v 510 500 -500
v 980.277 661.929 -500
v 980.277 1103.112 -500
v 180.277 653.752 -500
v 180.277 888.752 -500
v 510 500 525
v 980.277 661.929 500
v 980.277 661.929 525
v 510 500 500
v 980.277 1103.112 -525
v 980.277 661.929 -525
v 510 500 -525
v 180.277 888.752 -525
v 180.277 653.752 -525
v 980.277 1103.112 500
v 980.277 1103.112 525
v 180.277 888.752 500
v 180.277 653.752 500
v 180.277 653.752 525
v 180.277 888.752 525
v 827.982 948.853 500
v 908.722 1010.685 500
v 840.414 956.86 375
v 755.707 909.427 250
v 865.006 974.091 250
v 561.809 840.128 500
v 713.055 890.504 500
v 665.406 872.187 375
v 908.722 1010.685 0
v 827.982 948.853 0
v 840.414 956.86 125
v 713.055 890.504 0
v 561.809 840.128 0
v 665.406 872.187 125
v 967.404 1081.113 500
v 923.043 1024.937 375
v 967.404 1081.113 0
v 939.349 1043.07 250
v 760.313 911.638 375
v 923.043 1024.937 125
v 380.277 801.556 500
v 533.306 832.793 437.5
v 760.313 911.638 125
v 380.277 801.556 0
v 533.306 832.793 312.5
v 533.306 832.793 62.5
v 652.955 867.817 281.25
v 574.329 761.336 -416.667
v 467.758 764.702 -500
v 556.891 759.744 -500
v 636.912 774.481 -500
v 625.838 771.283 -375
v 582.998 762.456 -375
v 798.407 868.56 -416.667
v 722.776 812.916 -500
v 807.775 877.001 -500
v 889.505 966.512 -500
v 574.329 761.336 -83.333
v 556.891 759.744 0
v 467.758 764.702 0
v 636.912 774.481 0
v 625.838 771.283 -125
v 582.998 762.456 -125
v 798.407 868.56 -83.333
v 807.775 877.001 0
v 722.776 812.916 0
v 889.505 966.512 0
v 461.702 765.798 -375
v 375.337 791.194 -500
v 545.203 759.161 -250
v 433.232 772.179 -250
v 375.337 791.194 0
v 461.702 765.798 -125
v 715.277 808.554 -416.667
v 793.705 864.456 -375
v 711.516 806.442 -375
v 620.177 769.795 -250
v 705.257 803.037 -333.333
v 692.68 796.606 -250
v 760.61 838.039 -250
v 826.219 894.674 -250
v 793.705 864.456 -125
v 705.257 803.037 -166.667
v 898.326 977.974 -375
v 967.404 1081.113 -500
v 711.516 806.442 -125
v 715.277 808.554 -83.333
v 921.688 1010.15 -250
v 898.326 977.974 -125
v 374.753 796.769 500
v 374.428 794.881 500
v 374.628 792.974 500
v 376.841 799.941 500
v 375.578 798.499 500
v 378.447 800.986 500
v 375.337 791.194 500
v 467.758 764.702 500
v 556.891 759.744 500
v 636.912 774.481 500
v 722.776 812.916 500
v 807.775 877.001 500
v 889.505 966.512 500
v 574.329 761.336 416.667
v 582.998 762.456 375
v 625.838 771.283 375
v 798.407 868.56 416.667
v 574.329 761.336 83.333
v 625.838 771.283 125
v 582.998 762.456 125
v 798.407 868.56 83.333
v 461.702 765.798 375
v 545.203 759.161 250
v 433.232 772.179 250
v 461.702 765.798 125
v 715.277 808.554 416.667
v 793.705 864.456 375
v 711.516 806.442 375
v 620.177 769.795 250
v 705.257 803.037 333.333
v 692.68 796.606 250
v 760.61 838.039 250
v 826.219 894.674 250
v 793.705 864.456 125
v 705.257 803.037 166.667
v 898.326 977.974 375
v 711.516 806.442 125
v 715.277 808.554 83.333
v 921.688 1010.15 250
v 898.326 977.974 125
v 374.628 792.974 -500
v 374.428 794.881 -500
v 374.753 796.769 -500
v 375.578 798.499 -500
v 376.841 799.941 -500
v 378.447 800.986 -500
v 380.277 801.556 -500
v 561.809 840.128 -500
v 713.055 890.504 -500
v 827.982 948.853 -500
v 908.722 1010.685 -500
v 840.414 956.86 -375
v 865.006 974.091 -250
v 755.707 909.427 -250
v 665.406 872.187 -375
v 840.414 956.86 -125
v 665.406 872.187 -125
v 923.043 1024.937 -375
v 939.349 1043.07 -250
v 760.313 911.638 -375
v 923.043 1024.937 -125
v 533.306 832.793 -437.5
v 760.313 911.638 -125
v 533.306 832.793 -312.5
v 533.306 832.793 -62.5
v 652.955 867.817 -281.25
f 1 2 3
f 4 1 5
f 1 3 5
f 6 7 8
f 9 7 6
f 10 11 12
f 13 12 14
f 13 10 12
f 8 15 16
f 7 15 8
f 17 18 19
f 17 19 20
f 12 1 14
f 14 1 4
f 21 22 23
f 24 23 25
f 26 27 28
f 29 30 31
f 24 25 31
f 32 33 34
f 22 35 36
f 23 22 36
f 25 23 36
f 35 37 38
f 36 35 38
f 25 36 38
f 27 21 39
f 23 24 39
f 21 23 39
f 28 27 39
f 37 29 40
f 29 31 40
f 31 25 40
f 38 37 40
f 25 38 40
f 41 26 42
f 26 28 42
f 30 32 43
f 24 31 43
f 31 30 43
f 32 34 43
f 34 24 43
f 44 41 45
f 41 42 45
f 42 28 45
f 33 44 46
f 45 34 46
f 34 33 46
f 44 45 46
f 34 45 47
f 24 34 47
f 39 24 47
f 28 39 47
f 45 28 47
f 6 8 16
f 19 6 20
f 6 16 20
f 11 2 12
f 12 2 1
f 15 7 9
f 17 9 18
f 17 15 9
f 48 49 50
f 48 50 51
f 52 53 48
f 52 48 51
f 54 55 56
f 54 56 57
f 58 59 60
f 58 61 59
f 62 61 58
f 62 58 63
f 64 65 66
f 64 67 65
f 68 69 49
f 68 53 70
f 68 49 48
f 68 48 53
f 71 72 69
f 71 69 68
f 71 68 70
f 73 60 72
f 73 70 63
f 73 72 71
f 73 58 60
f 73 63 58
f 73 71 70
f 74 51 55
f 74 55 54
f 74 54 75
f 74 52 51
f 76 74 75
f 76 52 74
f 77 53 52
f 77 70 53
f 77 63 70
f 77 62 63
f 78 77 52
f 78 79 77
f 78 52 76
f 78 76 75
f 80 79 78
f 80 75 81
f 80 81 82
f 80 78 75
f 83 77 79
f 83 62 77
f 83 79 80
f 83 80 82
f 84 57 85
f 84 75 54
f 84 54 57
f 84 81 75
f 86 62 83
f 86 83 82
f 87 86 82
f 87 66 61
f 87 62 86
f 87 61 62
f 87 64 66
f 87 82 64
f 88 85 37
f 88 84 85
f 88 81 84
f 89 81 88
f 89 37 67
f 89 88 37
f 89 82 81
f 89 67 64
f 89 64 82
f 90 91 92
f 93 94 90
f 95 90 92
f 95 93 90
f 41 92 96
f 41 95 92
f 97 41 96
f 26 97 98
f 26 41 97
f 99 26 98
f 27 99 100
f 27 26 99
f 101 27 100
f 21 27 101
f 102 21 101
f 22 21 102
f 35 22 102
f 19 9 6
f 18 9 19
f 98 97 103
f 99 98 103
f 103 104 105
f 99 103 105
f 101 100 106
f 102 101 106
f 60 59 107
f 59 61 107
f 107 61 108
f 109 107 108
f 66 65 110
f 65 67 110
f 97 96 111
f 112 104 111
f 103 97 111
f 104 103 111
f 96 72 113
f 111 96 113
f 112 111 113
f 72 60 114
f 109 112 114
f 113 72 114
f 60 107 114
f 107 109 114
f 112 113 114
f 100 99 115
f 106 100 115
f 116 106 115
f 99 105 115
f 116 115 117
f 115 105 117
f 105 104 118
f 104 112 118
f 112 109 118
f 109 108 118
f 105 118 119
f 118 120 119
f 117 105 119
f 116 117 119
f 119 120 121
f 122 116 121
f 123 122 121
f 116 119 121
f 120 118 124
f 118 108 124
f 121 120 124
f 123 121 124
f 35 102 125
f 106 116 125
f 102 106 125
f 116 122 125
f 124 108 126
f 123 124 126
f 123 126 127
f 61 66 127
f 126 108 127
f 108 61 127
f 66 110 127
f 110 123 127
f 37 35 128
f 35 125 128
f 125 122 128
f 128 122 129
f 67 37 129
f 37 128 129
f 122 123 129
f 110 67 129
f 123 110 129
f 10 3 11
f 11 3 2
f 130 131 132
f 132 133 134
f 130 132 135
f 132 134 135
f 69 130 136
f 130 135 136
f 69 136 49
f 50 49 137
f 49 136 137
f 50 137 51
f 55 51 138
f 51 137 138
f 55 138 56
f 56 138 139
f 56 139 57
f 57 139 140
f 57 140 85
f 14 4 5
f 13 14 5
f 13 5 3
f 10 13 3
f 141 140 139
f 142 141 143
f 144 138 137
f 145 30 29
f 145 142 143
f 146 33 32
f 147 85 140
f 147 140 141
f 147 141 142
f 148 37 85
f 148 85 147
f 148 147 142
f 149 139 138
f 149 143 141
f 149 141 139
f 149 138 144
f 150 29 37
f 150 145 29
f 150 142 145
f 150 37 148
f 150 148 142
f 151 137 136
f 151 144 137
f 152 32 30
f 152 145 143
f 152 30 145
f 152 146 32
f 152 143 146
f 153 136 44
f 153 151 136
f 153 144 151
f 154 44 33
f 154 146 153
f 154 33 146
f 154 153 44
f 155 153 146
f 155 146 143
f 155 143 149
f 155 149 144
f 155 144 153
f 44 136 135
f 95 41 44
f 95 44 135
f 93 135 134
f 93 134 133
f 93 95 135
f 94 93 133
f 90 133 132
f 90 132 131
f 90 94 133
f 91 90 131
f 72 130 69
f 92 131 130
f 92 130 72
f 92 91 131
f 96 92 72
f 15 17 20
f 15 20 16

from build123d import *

# Parameters (mm, degrees)
BOSS_EXTRUDE4_START = 500
BOSS_EXTRUDE4_DEPTH = 25
BOSS_EXTRUDE5_DEPTH = 500


with BuildPart() as part:
    # Sketch3 → Boss-Extrude4 (new body)
    with BuildSketch(Plane.XY.offset(BOSS_EXTRUDE4_START)):
        Polygon((980.277216874, 1103.111612785), (980.277216874, 661.929431671), (510, 500), (180.277216874, 653.75225884), (180.277216874, 888.75225884), align=None)
    extrude(amount=BOSS_EXTRUDE4_DEPTH)


with BuildPart() as body_2:
    # Mirror6: mirrored copy
    add(part.part.mirror(Plane.XY))


with BuildPart() as body_3:
    # Sketch4 → Boss-Extrude5 (new body, symmetric)
    with BuildSketch(Plane.XY):
        with BuildLine():
            add(Edge.make_bspline(
                [(375.337243968, 791.193870862), (713.99043586, 657.058073837), (967.403573874, 1081.113118762)],
                knots=[0, 0, 0, 0.975124618, 0.975124618, 0.975124618], degree=2))
            add(Edge.make_bspline(
                [(967.403573874, 1081.113118762), (837.573835199, 877.51909723), (380.277216874, 801.555806392)],
                knots=[0.050458865, 0.050458865, 0.050458865, 1, 1, 1], degree=2))
            ThreePointArc((380.277216874, 801.555806392), (375.105625682, 797.662807865), (375.337243968, 791.193870862))
        make_face()
    extrude(amount=BOSS_EXTRUDE5_DEPTH, both=True)


solid = Compound([part.part, body_2.part, body_3.part])
